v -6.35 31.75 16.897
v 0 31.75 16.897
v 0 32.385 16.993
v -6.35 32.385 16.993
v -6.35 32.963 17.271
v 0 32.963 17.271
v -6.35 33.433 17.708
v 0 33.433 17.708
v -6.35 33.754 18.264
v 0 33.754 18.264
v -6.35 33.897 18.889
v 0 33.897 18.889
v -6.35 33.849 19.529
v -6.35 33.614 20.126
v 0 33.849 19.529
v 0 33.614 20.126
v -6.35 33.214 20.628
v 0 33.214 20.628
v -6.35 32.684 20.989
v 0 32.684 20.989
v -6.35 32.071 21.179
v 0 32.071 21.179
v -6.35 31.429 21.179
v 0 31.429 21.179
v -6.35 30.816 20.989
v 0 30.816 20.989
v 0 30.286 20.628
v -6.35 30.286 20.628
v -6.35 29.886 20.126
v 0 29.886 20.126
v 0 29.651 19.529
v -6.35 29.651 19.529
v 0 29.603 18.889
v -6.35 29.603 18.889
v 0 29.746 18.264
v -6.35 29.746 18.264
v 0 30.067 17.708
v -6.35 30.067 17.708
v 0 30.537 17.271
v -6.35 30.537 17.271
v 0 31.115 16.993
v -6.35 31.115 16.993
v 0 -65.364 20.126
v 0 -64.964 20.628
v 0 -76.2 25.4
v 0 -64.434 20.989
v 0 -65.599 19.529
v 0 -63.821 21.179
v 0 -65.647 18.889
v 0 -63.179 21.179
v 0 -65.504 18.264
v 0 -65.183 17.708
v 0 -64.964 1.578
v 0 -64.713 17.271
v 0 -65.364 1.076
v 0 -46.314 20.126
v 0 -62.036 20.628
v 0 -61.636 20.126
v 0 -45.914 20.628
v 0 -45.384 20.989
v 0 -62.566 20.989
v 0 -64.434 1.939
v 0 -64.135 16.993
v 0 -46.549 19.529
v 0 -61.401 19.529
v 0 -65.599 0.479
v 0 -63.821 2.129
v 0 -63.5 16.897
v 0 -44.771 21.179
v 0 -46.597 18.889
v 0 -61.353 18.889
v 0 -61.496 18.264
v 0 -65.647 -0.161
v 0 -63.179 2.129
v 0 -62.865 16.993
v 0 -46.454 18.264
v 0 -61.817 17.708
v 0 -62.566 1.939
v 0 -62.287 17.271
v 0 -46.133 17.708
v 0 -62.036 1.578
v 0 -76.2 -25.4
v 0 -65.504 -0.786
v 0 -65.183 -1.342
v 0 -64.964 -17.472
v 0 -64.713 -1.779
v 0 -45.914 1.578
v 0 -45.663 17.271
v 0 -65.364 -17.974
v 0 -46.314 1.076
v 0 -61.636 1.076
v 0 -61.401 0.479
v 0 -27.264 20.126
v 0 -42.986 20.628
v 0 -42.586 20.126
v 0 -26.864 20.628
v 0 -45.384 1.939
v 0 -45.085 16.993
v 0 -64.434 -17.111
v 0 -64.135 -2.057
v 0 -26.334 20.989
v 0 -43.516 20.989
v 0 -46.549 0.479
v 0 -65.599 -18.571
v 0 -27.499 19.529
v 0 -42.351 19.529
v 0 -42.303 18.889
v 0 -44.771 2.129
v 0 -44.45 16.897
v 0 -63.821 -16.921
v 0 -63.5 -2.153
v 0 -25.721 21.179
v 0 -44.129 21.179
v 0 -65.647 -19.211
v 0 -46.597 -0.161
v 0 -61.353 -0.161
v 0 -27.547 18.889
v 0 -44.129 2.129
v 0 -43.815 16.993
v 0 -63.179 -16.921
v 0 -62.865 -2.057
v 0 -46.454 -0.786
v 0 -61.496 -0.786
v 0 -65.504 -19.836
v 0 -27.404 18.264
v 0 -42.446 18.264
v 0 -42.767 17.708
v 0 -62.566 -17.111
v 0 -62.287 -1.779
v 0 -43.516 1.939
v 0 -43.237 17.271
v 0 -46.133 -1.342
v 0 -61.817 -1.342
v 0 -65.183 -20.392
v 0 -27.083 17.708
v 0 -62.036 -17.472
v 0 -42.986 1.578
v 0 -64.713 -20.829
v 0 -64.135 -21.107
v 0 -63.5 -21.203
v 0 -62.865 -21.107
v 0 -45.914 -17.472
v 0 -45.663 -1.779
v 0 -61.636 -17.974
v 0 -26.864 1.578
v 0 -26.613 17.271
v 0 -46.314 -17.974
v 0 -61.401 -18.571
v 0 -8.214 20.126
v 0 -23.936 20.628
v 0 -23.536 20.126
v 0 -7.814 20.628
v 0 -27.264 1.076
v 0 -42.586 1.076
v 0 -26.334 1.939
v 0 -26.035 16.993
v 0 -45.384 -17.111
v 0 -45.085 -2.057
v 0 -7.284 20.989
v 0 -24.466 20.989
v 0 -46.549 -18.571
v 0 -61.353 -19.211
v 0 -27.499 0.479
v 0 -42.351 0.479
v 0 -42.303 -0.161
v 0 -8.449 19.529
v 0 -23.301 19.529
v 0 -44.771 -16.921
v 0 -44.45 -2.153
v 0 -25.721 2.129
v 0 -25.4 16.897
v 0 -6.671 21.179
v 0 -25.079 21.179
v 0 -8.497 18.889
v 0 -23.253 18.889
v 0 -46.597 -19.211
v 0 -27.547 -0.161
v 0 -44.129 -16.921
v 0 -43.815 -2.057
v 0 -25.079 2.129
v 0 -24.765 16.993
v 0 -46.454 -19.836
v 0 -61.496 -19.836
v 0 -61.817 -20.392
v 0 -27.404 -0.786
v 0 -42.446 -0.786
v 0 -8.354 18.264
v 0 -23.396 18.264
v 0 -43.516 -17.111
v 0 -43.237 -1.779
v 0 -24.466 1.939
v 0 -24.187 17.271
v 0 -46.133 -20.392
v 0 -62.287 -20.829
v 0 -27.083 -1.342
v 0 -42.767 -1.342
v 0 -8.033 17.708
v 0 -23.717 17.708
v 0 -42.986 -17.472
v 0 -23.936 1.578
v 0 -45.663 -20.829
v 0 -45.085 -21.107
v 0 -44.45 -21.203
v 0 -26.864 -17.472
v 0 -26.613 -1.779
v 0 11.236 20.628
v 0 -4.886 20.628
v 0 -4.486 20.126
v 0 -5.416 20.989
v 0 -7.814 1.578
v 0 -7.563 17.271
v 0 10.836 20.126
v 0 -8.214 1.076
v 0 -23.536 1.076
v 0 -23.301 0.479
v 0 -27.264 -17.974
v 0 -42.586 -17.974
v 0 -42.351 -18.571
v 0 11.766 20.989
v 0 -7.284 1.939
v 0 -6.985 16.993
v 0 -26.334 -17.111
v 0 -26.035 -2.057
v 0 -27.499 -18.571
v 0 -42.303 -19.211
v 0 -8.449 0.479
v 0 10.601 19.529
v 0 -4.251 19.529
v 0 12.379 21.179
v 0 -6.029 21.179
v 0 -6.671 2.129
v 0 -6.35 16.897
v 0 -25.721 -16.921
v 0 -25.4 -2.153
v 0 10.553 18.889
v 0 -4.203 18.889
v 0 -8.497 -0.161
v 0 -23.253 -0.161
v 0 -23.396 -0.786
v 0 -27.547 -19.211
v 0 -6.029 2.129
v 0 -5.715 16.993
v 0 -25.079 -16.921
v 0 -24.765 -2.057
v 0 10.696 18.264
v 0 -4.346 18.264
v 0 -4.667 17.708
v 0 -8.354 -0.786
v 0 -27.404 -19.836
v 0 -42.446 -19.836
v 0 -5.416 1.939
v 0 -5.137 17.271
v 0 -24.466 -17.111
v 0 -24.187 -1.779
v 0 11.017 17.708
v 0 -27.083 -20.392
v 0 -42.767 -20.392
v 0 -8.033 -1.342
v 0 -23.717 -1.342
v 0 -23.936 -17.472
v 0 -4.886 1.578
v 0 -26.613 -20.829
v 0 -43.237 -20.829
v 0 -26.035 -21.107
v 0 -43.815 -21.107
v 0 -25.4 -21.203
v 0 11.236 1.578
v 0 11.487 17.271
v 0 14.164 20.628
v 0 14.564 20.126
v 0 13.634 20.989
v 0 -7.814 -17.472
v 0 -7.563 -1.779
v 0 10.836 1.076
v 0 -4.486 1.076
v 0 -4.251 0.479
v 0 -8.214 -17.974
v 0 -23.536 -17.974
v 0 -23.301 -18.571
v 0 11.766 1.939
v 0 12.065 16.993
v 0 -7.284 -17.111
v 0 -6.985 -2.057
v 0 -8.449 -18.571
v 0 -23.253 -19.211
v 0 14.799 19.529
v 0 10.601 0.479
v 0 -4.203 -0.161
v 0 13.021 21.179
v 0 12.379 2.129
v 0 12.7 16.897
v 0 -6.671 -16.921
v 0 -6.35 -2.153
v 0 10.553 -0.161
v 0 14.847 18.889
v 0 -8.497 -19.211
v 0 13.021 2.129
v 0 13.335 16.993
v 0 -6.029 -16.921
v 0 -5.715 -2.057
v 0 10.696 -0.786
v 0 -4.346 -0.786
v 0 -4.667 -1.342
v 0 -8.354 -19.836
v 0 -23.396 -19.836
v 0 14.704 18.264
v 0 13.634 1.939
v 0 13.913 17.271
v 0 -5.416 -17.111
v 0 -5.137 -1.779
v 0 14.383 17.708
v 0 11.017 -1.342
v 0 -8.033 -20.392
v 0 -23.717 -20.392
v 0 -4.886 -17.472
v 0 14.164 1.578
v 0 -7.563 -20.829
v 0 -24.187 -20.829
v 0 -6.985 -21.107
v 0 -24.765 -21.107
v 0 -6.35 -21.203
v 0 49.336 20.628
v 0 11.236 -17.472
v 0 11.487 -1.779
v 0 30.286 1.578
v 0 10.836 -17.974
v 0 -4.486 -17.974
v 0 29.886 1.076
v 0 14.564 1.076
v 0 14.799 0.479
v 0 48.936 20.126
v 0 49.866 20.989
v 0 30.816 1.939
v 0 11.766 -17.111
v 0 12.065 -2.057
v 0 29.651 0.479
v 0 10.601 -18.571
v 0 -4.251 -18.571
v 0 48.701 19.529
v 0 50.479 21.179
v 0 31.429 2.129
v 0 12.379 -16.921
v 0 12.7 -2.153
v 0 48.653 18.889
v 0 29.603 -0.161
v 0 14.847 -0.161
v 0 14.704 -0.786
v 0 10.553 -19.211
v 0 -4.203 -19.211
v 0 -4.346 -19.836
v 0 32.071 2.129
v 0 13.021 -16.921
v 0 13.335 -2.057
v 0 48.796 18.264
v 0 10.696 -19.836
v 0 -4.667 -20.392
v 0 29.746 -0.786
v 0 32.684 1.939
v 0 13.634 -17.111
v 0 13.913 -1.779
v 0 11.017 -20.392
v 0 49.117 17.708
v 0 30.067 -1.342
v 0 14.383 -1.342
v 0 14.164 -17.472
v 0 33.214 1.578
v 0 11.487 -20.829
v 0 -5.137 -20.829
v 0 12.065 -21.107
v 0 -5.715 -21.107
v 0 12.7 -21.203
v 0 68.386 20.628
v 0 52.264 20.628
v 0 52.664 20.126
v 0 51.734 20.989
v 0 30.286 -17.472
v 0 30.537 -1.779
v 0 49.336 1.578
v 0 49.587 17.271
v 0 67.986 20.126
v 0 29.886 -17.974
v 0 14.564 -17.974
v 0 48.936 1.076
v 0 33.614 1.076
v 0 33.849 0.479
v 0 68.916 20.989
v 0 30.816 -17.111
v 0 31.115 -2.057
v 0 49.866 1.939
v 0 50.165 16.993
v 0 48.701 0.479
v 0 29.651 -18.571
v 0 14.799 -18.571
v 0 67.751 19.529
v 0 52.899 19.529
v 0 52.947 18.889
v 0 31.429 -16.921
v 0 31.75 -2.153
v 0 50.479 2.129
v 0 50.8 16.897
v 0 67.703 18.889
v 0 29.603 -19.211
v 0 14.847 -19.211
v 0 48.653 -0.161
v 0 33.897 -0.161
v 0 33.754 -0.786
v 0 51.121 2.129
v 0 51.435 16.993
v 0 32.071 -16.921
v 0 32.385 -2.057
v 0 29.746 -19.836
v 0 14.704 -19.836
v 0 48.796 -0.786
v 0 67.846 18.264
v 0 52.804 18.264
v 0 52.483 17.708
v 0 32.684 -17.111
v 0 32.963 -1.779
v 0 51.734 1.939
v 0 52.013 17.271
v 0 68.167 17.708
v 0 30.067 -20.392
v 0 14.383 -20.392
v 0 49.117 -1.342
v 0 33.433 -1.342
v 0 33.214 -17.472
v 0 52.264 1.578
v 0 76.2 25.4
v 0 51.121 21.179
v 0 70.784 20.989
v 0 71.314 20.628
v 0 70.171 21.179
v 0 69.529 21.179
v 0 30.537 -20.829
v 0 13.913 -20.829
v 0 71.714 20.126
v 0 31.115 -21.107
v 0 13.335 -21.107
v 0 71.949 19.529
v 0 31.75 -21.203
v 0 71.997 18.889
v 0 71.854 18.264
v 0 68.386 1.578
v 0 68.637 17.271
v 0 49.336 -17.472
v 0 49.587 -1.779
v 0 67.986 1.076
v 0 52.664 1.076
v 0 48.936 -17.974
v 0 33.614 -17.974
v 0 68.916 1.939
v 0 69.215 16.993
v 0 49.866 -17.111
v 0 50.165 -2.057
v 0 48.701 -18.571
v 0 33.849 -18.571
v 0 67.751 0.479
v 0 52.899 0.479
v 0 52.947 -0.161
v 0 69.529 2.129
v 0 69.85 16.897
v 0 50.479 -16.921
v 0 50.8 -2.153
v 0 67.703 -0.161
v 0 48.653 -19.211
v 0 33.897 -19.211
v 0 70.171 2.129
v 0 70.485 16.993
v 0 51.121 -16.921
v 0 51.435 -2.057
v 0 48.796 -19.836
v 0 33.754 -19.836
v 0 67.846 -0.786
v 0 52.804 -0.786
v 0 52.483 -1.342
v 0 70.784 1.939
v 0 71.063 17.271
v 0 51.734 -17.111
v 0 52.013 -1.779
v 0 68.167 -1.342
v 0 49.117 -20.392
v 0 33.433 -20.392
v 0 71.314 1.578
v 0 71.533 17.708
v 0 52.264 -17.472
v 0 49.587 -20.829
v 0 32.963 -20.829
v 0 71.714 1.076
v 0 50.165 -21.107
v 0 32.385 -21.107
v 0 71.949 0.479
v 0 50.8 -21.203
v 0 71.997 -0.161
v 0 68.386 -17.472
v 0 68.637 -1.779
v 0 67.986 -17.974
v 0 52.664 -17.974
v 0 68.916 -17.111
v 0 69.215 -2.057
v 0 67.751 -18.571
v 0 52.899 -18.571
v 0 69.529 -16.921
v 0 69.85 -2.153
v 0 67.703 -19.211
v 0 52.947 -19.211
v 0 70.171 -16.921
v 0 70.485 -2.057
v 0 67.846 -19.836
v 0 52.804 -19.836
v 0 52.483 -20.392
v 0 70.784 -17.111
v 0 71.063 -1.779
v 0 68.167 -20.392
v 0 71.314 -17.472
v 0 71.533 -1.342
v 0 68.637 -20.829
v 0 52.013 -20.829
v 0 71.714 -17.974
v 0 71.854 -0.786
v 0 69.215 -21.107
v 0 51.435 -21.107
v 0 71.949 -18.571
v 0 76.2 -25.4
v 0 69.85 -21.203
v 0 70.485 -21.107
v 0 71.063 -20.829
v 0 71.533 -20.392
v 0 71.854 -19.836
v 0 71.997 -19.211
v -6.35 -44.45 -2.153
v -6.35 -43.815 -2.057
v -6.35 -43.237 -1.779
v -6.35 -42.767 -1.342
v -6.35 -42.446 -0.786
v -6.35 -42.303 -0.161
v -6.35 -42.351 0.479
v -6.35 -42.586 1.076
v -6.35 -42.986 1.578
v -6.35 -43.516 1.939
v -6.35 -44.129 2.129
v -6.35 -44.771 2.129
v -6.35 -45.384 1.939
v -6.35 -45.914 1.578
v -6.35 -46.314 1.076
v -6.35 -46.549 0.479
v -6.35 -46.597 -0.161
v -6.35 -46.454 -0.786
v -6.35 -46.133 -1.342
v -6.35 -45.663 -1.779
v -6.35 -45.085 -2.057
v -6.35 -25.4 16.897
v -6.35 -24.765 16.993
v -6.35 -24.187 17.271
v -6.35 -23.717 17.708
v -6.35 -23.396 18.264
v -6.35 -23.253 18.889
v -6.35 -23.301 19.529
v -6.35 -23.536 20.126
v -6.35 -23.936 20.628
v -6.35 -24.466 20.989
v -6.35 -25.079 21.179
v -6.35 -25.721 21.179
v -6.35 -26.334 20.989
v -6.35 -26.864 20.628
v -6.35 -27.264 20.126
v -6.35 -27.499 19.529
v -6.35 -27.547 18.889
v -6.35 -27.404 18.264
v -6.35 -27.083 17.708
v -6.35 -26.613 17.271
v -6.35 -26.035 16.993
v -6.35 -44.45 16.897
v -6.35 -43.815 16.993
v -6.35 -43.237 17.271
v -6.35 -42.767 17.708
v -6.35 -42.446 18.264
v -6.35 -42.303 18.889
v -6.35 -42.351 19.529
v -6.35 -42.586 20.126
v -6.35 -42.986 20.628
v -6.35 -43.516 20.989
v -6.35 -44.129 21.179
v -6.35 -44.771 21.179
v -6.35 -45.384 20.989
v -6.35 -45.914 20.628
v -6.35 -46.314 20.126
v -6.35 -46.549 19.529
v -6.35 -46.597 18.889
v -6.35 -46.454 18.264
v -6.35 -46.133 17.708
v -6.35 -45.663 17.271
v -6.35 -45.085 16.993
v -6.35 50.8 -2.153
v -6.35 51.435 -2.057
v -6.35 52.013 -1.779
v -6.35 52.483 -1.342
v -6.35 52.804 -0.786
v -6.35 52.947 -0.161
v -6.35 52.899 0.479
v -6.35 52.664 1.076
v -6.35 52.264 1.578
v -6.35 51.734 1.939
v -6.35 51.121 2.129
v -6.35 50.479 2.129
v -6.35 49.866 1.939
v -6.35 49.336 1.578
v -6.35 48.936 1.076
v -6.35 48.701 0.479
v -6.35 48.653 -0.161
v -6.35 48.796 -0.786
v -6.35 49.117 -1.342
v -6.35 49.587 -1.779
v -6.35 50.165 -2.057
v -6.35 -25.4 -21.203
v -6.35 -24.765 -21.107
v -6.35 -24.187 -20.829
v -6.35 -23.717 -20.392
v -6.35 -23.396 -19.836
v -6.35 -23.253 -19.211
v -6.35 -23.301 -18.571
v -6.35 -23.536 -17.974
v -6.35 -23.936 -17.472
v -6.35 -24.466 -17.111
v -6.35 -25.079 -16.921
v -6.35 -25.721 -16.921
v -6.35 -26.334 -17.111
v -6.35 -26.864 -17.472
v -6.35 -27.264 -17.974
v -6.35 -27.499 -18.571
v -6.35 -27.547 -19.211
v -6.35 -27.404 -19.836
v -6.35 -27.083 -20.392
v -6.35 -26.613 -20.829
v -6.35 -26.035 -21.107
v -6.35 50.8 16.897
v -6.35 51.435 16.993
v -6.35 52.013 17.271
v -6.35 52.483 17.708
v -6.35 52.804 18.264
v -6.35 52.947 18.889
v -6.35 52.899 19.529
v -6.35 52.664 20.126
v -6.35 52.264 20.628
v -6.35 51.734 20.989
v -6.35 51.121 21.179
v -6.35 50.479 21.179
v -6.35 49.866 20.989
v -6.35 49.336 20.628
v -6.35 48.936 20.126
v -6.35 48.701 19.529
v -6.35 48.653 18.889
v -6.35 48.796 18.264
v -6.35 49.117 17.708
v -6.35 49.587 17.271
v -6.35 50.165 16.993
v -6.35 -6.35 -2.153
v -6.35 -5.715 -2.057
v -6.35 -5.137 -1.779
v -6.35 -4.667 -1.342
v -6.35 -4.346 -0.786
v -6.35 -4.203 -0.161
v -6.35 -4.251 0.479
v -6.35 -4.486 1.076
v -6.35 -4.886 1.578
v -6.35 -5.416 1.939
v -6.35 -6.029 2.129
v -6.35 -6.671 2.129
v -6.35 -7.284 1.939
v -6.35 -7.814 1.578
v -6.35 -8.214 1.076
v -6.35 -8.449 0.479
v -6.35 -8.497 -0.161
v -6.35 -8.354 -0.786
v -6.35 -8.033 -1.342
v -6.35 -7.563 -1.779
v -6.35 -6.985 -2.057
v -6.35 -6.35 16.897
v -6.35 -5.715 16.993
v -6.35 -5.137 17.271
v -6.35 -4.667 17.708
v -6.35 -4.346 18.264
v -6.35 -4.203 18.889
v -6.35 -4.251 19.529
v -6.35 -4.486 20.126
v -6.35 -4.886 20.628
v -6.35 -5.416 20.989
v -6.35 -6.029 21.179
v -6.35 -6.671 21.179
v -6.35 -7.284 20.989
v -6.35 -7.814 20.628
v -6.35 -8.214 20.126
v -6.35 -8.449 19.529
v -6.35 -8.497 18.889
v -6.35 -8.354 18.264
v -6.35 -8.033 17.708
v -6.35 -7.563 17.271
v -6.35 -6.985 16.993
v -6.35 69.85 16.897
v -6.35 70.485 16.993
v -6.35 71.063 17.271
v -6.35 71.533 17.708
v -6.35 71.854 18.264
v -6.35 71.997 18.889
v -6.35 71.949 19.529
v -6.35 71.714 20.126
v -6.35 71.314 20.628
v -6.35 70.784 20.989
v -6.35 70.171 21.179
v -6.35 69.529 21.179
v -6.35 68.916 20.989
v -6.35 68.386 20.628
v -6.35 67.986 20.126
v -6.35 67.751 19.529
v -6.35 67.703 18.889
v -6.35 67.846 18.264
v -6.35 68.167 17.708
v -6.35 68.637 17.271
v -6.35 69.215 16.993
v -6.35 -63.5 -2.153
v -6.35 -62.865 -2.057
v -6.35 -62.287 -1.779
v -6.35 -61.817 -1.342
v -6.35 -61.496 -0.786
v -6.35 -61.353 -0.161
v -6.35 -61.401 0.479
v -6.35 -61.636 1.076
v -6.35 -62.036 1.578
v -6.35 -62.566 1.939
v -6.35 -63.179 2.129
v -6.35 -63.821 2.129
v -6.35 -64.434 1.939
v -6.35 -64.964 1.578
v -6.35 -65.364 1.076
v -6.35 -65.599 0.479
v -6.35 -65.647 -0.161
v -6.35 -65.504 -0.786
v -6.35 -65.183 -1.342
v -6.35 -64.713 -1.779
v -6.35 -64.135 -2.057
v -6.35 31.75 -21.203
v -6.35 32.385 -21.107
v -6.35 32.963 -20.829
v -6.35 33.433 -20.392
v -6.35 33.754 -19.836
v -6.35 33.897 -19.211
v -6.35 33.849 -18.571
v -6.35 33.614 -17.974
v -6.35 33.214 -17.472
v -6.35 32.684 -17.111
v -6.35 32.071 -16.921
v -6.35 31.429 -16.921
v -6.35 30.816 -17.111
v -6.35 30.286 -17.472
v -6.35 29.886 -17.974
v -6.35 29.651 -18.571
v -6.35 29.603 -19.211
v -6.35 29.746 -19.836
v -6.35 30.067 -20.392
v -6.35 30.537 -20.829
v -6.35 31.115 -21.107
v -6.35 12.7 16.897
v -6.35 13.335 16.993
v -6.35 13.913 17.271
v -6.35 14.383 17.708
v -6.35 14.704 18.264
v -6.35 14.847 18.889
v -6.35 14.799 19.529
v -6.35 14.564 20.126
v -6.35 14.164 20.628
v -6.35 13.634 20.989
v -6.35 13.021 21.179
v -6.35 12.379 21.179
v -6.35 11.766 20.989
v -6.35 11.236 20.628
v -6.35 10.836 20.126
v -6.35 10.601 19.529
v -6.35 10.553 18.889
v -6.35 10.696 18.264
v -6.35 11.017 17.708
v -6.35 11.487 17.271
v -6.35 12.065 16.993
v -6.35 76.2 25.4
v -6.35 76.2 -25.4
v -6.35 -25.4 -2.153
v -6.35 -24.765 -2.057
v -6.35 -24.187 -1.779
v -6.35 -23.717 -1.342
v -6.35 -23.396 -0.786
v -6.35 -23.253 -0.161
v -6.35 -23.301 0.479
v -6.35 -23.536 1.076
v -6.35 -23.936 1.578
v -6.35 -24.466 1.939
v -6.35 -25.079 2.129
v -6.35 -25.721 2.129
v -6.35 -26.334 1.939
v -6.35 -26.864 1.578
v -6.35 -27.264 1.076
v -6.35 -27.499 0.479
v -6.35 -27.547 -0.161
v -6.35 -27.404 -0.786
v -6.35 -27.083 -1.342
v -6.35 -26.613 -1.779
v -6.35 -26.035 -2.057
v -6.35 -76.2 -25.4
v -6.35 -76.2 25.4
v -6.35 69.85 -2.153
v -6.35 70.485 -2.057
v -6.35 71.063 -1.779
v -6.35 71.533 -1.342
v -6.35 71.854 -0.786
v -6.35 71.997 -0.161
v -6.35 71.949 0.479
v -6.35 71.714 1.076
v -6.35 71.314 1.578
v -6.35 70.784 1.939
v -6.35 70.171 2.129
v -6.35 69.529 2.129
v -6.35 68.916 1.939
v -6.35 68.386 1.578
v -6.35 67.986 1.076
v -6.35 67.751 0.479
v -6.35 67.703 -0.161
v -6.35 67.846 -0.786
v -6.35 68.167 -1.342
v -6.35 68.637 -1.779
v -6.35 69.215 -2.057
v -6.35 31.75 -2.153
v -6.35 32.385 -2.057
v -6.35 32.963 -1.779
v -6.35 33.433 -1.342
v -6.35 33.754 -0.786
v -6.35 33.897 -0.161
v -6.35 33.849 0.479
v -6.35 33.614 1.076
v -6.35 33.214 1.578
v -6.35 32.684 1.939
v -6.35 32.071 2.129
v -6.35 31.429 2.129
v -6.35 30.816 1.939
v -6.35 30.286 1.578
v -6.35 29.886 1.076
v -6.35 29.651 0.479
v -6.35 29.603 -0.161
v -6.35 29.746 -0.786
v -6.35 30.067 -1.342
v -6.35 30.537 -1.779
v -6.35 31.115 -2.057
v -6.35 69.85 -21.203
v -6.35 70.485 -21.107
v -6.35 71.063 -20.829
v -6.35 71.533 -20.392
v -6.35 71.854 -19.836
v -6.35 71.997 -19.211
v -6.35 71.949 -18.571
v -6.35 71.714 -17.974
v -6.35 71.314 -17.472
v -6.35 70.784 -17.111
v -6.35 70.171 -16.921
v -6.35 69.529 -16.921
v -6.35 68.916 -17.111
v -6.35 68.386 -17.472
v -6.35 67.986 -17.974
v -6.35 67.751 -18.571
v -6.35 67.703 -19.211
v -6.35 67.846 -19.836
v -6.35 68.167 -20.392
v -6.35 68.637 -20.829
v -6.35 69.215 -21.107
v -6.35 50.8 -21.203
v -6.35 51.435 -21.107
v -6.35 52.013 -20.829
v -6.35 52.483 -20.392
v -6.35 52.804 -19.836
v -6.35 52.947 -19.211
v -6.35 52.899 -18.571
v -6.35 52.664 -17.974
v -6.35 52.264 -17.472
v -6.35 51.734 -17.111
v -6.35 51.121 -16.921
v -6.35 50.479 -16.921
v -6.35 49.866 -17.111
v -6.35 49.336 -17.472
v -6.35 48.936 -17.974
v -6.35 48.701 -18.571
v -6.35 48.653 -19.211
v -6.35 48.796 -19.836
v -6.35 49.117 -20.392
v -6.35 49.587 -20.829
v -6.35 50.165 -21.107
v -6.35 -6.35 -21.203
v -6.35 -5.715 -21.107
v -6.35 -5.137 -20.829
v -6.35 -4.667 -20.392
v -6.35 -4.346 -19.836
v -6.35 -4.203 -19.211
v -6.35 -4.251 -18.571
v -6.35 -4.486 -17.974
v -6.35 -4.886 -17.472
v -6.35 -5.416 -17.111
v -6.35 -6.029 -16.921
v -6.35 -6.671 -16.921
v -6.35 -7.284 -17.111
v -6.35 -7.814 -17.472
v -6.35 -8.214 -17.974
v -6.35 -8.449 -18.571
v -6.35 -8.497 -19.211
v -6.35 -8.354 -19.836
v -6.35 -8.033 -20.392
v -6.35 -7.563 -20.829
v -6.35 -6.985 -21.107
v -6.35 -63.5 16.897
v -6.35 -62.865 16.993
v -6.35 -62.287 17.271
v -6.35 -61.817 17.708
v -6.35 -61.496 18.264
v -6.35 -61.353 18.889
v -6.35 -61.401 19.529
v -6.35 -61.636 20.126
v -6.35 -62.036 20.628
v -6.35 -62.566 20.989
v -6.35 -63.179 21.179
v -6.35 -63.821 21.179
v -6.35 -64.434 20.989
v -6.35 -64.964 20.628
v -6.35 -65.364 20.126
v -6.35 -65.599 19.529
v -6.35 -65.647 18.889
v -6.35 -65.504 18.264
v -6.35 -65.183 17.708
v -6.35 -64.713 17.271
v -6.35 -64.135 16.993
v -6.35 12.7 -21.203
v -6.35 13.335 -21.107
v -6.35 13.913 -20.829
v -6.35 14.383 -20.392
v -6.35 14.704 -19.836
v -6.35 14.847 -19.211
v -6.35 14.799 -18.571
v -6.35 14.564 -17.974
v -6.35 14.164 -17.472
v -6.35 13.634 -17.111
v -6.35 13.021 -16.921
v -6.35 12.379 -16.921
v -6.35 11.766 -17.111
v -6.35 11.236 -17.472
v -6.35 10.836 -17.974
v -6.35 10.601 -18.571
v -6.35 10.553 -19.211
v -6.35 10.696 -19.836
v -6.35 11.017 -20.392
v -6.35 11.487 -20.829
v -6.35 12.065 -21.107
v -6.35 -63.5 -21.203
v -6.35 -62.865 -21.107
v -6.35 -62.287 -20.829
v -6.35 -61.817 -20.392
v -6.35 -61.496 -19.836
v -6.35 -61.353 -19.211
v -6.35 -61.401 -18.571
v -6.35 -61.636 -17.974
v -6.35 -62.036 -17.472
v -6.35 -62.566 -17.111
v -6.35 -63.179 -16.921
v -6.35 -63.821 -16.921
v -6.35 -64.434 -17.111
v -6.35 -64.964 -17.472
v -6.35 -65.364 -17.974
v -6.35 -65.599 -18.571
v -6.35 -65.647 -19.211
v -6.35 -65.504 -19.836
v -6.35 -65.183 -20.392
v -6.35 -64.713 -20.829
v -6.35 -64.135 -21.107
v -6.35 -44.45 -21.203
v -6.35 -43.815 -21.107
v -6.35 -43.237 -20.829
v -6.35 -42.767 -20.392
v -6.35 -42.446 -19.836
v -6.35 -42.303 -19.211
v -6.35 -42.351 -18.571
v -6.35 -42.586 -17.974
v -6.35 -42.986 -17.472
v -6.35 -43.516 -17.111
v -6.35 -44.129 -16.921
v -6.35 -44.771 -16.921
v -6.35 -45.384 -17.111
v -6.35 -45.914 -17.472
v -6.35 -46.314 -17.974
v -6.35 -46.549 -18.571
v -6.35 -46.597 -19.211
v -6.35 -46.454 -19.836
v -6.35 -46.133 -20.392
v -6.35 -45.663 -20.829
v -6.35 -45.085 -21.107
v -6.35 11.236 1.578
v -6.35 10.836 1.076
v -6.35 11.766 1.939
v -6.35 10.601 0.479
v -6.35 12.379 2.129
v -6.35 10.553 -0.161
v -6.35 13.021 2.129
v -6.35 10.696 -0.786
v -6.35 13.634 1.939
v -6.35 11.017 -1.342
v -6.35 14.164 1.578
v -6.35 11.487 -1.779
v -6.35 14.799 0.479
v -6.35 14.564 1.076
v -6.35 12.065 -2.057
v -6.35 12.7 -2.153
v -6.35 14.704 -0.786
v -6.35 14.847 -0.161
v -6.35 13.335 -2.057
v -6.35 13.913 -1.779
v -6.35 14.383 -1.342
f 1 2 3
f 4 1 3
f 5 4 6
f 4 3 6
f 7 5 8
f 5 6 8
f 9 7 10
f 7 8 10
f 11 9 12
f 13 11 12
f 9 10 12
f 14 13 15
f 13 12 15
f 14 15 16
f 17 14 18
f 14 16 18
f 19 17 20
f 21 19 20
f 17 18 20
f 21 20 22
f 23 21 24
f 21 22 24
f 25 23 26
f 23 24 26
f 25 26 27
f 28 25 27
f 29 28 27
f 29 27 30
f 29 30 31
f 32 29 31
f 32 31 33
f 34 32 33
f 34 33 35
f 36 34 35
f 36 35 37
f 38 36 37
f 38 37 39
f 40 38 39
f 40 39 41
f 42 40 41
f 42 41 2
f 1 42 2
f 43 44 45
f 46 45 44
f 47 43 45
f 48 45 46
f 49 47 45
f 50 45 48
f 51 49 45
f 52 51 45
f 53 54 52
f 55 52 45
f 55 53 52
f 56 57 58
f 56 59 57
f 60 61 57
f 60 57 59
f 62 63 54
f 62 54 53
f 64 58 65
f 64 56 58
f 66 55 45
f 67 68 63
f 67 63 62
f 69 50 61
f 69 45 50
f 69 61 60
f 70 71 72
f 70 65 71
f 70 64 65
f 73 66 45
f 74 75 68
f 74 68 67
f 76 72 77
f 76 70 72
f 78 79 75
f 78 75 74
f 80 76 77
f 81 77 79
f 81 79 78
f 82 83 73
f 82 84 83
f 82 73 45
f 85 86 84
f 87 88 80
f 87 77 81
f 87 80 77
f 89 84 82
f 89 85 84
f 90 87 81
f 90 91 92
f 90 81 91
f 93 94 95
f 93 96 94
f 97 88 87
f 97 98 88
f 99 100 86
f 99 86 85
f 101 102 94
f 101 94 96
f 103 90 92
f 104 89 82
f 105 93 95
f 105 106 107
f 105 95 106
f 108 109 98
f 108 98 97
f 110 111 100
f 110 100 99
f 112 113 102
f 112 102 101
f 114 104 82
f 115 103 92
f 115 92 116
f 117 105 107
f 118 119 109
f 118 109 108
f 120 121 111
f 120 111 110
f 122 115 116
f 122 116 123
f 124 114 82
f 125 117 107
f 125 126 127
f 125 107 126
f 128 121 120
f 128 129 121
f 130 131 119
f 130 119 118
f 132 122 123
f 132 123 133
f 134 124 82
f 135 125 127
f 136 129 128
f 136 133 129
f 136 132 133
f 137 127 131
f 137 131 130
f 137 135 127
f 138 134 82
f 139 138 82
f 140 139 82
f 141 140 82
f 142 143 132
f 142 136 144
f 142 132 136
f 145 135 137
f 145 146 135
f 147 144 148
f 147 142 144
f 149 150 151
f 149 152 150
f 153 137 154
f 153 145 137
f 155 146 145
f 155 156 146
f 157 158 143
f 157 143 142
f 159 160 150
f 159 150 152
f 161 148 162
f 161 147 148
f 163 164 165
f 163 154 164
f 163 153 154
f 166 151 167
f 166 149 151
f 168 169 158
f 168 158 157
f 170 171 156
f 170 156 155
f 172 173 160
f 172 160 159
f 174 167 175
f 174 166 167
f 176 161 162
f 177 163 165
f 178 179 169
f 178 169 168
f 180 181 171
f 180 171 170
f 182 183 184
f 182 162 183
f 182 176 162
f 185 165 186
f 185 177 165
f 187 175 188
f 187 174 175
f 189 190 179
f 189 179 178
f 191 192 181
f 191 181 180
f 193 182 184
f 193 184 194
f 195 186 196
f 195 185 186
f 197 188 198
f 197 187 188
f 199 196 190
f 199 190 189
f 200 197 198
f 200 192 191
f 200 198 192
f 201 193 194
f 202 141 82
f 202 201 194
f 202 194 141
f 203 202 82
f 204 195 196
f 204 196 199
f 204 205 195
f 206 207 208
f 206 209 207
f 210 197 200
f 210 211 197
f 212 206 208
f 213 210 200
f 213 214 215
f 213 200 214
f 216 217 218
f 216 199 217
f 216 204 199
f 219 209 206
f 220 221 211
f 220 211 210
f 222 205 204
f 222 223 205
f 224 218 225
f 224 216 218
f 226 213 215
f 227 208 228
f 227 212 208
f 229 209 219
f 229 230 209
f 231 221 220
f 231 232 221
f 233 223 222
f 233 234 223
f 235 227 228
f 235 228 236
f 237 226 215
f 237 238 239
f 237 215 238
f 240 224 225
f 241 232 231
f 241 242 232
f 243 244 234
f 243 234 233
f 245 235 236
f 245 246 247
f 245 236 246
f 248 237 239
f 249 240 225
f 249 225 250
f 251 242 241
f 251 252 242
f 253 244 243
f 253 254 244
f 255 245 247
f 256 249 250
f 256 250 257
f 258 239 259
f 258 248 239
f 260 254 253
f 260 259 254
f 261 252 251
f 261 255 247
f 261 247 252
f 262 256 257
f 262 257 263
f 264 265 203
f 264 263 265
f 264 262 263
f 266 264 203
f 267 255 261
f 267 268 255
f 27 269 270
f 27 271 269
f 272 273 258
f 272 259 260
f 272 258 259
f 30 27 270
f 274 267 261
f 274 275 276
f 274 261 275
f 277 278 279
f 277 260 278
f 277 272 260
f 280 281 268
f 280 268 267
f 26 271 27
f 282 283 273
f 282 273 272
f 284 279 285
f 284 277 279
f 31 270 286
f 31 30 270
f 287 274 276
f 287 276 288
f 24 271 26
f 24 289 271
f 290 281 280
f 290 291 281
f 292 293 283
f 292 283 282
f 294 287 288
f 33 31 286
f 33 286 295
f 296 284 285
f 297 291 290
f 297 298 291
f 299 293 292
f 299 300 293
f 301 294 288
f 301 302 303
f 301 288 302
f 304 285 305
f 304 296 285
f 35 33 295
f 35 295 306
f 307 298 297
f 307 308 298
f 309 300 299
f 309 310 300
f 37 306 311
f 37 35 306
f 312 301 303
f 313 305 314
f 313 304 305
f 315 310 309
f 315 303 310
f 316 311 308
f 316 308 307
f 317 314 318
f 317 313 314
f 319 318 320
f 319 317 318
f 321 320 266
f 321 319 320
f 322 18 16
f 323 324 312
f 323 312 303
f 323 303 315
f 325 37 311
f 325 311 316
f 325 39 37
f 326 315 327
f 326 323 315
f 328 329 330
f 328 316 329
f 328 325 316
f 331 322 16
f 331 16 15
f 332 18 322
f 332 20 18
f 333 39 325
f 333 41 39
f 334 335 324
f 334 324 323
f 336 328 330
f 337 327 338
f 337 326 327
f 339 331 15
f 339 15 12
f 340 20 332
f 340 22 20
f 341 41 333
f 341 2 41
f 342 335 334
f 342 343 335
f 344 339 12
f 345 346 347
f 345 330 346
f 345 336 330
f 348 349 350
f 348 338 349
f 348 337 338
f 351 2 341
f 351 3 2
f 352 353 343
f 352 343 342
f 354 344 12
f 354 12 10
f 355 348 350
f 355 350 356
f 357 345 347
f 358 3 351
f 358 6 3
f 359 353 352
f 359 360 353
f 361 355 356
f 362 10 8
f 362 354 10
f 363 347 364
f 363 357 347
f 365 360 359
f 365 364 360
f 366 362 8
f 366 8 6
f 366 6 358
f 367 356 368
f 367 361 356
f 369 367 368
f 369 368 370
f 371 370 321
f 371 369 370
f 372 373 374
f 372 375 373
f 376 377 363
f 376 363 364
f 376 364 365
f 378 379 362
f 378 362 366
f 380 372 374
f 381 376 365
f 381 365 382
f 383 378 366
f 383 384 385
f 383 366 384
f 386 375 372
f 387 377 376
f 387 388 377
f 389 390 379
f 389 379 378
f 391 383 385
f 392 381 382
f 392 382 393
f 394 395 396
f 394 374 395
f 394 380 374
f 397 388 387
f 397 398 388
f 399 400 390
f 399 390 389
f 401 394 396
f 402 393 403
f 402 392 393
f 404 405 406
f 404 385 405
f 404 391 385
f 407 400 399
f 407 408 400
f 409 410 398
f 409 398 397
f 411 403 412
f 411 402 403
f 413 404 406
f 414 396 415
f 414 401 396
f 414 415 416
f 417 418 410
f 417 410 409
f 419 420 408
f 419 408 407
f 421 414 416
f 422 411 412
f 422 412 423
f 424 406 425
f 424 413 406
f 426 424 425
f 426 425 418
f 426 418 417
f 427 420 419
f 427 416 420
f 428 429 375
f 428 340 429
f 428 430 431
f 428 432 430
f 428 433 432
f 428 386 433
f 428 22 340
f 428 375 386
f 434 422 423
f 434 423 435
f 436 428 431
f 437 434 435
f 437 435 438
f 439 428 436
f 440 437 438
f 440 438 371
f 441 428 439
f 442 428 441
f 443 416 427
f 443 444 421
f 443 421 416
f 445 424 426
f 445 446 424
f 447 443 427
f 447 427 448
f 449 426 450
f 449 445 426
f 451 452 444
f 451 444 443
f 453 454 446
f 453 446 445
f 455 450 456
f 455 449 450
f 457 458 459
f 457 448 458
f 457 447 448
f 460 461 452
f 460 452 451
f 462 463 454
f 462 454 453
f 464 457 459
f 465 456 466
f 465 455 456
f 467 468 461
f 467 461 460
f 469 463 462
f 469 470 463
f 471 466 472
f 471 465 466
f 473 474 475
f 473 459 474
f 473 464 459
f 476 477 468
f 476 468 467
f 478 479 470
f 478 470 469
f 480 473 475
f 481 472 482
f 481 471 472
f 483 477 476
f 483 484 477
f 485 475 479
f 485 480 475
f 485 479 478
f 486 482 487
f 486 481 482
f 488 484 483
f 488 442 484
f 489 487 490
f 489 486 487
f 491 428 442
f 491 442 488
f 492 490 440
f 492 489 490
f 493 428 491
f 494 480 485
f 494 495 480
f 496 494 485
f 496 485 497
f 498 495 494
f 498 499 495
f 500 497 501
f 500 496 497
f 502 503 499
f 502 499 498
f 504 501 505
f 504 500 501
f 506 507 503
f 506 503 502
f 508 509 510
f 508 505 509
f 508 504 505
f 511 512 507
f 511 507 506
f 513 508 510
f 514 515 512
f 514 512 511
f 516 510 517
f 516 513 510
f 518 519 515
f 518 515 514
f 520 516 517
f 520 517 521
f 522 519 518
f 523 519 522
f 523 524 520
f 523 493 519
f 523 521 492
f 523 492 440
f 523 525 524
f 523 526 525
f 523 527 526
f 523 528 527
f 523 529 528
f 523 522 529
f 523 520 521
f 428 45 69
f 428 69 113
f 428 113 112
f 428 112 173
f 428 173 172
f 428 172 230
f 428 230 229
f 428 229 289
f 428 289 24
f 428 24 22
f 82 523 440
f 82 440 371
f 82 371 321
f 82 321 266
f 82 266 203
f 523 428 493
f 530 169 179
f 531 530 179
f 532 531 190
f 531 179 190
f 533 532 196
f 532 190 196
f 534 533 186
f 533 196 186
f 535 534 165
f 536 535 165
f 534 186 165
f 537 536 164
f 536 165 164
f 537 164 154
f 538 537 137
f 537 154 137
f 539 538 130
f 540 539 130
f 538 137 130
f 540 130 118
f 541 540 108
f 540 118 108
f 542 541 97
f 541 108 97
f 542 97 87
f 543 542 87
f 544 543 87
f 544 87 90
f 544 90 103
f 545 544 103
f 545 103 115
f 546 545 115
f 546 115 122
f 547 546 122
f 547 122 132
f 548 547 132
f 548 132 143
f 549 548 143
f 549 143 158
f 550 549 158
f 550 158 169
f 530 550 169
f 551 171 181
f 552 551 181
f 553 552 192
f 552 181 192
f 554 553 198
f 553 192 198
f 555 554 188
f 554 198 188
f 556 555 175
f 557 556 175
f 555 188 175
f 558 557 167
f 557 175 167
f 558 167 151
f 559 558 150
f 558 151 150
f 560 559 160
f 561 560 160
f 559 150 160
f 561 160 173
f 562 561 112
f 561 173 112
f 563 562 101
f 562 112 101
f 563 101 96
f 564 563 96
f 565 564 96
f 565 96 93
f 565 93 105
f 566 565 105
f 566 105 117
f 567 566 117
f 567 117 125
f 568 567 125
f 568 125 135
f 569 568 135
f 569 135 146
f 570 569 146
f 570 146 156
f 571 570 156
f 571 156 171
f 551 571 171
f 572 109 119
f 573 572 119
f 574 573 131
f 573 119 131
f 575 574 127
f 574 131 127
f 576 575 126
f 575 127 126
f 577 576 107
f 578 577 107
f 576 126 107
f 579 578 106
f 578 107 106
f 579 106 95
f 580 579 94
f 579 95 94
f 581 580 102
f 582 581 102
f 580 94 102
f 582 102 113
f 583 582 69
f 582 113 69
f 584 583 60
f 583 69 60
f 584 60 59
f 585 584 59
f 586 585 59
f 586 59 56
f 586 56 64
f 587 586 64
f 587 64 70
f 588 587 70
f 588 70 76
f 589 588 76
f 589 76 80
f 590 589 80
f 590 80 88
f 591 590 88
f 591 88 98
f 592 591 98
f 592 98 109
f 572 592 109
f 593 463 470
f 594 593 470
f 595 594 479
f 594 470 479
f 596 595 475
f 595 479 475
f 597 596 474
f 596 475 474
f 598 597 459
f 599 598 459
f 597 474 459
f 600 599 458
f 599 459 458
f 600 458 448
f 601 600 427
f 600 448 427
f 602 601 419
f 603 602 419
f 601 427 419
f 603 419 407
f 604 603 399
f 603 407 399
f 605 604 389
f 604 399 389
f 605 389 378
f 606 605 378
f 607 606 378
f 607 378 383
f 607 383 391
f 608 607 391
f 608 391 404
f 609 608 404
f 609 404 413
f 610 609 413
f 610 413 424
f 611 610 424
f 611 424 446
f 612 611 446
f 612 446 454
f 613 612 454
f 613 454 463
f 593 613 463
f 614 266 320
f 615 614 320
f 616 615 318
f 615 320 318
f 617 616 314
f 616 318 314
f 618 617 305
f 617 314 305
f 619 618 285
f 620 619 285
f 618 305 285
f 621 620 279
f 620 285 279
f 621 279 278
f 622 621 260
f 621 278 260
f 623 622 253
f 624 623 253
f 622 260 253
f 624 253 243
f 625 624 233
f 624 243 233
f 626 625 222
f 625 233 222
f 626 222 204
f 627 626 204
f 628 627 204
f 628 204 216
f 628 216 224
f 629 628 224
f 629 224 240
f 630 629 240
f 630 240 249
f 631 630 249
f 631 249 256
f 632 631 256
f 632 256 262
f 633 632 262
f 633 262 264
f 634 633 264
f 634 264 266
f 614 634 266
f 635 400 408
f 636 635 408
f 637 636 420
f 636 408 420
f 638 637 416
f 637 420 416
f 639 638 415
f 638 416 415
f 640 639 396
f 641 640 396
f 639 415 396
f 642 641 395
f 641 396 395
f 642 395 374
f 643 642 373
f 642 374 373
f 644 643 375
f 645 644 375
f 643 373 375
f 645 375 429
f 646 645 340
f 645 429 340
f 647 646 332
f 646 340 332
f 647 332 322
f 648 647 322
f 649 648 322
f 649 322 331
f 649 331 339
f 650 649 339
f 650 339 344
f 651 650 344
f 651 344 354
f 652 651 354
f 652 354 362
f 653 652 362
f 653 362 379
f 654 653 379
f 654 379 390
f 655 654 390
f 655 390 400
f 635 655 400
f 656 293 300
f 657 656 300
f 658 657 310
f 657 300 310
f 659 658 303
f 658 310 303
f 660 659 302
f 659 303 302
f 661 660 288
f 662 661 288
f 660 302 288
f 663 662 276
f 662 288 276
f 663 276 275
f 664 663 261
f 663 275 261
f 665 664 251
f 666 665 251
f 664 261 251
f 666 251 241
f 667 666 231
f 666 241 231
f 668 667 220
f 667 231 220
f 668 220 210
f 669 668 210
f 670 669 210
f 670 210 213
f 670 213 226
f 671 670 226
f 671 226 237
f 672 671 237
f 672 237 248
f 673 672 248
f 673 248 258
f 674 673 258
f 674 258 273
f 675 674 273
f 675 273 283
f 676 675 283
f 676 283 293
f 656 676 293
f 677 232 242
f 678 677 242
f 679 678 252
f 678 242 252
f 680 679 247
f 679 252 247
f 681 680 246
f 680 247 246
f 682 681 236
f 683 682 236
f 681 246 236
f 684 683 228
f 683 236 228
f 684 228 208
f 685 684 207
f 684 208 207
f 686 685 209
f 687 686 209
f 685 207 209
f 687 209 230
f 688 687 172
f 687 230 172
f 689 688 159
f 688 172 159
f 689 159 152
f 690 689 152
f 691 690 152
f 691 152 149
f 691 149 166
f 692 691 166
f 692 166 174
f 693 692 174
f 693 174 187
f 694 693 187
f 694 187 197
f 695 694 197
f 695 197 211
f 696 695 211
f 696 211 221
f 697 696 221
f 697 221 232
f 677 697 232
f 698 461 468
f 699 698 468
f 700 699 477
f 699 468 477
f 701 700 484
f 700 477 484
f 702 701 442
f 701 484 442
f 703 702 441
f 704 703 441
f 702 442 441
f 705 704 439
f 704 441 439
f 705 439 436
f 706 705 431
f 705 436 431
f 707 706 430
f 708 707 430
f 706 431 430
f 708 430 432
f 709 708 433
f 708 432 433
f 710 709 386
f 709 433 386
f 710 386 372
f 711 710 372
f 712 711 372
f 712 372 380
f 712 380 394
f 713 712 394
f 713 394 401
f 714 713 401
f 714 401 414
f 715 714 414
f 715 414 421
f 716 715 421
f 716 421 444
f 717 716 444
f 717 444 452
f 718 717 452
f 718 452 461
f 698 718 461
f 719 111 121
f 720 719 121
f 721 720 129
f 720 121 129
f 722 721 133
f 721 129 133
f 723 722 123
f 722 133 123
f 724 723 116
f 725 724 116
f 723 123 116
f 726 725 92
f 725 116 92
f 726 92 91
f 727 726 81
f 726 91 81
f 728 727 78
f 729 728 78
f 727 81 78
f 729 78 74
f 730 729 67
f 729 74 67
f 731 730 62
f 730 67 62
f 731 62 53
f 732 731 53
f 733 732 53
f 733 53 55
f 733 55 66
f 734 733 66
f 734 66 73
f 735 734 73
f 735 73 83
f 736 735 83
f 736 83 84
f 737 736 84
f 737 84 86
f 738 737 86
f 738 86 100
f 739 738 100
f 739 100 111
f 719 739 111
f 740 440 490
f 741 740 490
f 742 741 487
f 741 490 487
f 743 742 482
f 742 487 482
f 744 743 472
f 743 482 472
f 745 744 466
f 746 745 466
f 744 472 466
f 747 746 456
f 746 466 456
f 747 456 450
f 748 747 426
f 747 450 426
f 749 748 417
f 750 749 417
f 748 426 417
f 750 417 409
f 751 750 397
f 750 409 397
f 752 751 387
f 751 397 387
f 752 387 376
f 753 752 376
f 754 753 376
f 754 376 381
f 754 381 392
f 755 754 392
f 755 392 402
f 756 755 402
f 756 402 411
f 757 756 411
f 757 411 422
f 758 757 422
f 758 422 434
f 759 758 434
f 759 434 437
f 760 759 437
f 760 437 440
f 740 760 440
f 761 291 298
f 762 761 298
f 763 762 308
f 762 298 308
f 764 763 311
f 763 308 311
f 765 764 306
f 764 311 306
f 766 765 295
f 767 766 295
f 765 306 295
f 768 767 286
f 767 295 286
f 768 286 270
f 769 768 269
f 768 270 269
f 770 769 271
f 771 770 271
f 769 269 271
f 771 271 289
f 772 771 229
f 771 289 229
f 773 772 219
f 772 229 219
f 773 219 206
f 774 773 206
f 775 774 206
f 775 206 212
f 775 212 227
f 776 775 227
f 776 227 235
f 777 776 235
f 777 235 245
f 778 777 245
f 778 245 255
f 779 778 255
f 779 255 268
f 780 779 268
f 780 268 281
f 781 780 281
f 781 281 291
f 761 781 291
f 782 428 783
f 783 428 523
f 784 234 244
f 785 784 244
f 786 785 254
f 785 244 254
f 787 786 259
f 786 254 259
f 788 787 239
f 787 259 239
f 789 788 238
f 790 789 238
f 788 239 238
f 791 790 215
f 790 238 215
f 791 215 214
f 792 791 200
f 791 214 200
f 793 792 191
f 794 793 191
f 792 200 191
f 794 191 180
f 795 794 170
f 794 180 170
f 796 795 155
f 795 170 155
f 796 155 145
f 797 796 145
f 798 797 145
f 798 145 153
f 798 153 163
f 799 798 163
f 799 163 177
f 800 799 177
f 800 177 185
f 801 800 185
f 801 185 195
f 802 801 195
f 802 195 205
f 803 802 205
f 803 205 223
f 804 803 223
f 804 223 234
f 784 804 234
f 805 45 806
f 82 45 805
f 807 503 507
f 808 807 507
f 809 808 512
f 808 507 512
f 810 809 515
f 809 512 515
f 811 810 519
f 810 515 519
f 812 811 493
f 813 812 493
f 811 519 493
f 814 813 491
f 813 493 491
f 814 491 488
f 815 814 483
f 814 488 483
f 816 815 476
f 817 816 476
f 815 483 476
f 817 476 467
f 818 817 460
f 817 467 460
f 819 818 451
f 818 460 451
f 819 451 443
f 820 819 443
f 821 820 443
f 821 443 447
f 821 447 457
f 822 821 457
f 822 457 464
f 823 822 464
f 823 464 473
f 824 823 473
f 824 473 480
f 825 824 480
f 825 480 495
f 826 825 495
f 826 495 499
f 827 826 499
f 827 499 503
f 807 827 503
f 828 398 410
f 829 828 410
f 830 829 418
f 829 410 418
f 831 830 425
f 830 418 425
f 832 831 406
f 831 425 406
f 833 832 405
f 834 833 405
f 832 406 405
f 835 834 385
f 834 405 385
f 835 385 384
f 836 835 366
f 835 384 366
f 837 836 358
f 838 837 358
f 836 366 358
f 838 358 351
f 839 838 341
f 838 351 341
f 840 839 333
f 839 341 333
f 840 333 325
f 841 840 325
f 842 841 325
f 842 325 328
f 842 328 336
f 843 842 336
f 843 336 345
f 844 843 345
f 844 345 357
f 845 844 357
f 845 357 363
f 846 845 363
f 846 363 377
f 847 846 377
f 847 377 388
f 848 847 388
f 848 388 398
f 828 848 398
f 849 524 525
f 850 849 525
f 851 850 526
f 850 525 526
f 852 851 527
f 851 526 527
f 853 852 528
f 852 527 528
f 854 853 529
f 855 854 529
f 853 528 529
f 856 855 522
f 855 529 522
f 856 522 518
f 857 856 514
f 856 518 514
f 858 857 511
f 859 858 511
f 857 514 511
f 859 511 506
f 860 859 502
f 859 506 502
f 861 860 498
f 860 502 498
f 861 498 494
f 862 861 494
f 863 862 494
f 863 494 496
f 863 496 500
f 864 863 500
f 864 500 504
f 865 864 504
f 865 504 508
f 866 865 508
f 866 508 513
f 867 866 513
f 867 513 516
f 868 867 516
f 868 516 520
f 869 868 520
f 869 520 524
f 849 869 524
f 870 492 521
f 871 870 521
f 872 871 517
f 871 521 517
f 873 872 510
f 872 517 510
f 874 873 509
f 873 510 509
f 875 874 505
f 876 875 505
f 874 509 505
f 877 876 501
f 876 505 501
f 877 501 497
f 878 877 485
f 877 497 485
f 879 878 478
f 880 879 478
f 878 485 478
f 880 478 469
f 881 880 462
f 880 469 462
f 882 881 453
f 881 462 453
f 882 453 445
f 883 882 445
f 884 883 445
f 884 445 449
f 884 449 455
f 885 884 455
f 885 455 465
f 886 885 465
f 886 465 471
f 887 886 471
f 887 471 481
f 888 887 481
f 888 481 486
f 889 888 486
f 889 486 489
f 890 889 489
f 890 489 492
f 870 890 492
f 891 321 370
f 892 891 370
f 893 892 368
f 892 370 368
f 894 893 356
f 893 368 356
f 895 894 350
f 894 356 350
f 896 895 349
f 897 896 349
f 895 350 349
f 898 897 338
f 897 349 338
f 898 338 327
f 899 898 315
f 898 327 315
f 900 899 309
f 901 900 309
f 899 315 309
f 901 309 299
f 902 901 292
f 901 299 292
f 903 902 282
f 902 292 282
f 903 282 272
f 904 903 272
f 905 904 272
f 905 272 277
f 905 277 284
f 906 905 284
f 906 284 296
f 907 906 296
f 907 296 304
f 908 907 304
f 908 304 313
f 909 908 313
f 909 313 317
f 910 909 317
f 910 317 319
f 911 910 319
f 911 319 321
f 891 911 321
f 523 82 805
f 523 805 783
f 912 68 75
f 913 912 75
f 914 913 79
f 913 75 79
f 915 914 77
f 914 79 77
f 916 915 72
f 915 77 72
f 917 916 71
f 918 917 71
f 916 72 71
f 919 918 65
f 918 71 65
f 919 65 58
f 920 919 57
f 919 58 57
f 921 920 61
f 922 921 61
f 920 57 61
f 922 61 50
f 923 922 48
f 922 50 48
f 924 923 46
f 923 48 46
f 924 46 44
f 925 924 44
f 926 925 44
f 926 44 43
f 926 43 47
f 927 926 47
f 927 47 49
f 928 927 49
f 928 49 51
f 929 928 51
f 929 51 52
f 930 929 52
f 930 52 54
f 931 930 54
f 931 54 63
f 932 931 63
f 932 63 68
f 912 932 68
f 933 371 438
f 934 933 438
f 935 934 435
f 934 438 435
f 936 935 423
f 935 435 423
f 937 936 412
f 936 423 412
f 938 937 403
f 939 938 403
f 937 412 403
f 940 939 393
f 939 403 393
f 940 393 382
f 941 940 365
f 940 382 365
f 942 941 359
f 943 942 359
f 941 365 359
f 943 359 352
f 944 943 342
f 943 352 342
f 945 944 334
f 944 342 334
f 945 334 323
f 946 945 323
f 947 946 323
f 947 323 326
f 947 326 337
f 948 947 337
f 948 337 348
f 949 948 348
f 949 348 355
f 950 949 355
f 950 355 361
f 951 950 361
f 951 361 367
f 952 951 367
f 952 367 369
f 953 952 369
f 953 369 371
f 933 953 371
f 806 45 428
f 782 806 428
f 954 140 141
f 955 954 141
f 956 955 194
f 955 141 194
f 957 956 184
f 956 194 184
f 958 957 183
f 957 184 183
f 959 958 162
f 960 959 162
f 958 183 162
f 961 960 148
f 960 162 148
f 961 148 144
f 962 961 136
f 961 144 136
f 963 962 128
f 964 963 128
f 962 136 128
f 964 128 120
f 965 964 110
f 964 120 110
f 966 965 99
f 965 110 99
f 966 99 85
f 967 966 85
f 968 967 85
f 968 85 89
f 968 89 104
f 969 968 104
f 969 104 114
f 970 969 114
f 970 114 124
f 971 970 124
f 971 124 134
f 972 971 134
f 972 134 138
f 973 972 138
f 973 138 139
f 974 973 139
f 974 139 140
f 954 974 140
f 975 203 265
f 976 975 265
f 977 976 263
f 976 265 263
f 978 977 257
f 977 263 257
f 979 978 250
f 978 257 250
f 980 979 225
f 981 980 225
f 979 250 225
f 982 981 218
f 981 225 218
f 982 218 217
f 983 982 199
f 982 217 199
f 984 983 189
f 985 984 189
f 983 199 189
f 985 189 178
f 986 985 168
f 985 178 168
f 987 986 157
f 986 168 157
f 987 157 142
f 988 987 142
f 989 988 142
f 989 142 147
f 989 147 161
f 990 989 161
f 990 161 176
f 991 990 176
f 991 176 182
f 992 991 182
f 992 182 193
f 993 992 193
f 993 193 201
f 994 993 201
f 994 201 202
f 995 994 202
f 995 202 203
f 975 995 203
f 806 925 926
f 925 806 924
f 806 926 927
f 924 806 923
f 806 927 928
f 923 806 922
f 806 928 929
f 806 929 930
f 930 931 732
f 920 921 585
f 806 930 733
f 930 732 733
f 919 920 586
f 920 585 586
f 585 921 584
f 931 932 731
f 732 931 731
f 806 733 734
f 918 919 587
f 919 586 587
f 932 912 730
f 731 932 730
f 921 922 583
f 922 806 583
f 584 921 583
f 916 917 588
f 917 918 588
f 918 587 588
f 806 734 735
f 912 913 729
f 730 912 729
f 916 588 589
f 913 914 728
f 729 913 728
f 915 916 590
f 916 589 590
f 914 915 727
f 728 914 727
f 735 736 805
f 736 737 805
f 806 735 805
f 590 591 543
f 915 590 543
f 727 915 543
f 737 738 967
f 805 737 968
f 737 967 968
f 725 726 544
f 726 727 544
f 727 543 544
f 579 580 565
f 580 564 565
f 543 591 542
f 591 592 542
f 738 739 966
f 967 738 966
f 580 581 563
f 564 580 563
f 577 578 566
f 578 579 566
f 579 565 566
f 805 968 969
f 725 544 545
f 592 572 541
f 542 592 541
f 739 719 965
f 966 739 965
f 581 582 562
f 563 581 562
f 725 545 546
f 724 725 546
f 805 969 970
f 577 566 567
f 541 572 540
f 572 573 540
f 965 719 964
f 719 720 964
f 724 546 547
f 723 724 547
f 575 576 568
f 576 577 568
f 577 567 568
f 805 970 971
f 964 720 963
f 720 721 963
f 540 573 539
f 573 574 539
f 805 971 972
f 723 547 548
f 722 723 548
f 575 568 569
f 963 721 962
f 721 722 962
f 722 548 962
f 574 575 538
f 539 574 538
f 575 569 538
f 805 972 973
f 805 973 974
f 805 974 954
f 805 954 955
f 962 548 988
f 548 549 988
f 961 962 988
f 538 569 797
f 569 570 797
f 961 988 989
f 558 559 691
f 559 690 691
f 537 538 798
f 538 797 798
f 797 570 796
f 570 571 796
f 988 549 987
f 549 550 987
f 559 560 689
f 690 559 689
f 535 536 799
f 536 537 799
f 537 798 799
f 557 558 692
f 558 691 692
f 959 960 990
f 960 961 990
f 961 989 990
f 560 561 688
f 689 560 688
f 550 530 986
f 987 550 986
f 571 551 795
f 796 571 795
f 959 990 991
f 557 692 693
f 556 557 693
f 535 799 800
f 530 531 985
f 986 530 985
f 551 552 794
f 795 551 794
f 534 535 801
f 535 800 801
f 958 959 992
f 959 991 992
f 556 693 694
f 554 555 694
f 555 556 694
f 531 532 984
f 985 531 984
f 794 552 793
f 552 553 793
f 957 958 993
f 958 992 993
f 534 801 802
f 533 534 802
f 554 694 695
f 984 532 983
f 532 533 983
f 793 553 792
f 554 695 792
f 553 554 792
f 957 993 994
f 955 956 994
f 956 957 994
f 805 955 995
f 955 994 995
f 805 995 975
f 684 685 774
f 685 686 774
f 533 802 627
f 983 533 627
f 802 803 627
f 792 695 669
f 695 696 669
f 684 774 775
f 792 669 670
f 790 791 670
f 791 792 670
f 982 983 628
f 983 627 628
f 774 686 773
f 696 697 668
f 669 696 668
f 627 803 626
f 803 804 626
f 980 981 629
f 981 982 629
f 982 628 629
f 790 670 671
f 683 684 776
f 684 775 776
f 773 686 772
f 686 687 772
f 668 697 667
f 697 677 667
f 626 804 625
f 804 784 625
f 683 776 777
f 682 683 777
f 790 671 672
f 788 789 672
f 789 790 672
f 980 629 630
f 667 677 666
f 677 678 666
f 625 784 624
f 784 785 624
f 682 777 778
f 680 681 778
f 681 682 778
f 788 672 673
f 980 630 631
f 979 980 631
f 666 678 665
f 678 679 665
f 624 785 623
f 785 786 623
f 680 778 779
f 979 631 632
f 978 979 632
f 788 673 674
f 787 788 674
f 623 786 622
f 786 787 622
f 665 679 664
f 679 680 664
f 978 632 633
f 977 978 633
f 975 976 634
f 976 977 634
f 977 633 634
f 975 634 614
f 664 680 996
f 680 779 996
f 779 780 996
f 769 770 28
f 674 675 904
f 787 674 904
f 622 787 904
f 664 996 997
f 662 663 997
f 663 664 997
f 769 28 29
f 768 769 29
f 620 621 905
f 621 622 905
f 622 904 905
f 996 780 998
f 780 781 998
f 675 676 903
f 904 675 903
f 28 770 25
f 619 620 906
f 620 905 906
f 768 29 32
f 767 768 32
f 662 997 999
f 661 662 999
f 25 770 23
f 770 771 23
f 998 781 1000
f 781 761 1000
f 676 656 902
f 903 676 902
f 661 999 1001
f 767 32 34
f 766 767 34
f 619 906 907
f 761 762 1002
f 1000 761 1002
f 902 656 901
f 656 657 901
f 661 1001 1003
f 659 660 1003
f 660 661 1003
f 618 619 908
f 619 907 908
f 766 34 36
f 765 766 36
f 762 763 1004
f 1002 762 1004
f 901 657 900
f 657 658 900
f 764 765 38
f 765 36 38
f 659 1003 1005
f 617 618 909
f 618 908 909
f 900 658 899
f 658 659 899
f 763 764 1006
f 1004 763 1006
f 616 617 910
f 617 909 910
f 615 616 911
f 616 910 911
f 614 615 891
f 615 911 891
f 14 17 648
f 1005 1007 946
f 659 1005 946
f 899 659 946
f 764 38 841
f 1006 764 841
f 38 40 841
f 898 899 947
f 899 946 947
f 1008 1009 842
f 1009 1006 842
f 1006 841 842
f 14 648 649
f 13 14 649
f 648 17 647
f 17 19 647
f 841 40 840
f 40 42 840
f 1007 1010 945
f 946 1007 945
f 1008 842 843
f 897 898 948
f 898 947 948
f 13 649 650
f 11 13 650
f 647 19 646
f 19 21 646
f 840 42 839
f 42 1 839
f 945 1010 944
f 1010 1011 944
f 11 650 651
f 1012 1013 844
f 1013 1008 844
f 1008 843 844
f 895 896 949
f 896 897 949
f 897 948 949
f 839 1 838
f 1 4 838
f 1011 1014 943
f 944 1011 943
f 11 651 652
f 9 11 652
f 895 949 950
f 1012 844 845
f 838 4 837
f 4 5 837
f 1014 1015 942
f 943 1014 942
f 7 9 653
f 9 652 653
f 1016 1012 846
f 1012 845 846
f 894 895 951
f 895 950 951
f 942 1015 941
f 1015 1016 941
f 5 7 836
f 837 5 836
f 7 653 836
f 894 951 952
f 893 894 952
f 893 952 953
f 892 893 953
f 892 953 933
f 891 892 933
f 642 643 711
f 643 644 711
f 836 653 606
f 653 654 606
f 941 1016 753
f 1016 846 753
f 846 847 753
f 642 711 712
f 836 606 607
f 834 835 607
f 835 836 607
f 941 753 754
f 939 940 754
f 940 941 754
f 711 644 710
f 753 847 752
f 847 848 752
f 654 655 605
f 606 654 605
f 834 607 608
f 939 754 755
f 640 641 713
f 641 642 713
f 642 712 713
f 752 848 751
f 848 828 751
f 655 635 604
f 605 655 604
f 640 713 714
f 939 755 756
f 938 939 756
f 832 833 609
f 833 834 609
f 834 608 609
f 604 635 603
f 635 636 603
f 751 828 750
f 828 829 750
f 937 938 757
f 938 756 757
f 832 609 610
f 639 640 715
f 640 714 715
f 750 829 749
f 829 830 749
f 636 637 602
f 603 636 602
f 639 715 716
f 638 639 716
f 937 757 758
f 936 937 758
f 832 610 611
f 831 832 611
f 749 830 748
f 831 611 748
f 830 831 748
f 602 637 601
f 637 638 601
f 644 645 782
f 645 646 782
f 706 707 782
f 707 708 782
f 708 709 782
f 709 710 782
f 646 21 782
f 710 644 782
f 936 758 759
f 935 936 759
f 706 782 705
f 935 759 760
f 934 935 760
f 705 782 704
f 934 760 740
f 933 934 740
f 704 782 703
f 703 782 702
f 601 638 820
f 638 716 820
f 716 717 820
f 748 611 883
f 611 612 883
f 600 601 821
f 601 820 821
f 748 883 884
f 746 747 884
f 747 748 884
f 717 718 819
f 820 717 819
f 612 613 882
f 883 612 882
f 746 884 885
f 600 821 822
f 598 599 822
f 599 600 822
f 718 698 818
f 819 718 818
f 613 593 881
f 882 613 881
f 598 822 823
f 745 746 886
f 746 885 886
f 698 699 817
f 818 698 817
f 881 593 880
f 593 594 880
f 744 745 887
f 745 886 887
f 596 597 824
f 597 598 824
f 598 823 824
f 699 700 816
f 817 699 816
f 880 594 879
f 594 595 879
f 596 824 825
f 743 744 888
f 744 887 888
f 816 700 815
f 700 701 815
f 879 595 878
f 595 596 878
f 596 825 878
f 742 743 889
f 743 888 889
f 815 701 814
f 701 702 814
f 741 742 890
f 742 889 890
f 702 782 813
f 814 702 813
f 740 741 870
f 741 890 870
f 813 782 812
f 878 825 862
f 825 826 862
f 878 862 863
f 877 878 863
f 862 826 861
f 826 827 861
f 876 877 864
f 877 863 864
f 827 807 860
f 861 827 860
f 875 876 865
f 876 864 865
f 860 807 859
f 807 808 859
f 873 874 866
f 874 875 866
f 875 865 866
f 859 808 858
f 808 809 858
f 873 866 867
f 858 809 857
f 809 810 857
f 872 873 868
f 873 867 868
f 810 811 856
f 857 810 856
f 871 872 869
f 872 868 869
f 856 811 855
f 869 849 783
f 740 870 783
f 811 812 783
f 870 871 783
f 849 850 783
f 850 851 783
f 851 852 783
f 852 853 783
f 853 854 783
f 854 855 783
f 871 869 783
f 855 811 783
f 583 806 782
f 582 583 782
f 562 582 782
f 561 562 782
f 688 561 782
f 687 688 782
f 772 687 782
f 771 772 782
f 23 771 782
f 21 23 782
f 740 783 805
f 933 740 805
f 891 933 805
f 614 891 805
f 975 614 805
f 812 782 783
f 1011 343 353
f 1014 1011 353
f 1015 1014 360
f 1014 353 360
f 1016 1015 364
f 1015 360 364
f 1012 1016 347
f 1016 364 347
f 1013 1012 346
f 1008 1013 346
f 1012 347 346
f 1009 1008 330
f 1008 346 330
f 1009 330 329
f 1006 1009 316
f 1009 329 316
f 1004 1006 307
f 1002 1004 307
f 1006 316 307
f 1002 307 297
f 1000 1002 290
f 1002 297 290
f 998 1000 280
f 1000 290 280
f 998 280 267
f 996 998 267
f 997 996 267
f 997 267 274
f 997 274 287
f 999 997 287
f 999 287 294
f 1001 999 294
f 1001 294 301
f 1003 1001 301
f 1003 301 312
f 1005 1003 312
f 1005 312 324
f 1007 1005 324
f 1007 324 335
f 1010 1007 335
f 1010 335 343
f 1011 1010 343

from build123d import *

# Parameters (mm, degrees)
SKETCH1_W           = 50.8
SKETCH1_H           = 152.4
BOSS_EXTRUDE1_DEPTH = 6.35
SKETCH2_R           = 2.15265
CUT_EXTRUDE1_DEPTH  = 81.572467382


with BuildPart() as part:
    # Sketch1 → Boss-Extrude1 (new body)
    with BuildSketch(Plane(origin=(0, 0, 0), x_dir=(0, 0, -1), z_dir=(1, 0, 0))):
        Rectangle(SKETCH1_W, SKETCH1_H)
    extrude(amount=-BOSS_EXTRUDE1_DEPTH)

    # Sketch2 → Cut-Extrude1 (cut, through all)
    with BuildSketch(Plane(origin=(0, 0, 0), x_dir=(0, 0, -1), z_dir=(1, 0, 0))):
        with Locations((-19.05, 69.85)):
            Circle(SKETCH2_R)
        with Locations((0, 69.85)):
            Circle(SKETCH2_R)
        with Locations((19.05, 69.85)):
            Circle(SKETCH2_R)
        with Locations((0, 50.8)):
            Circle(SKETCH2_R)
        with Locations((19.05, 50.8)):
            Circle(SKETCH2_R)
        with Locations((0, 31.75)):
            Circle(SKETCH2_R)
        with Locations((19.05, 31.75)):
            Circle(SKETCH2_R)
        with Locations((0, 12.7)):
            Circle(SKETCH2_R)
        with Locations((19.05, 12.7)):
            Circle(SKETCH2_R)
        with Locations((0, -6.35)):
            Circle(SKETCH2_R)
        with Locations((19.05, -6.35)):
            Circle(SKETCH2_R)
        with Locations((0, -25.4)):
            Circle(SKETCH2_R)
        with Locations((19.05, -25.4)):
            Circle(SKETCH2_R)
        with Locations((0, -44.45)):
            Circle(SKETCH2_R)
        with Locations((19.05, -44.45)):
            Circle(SKETCH2_R)
        with Locations((0, -63.5)):
            Circle(SKETCH2_R)
        with Locations((19.05, -63.5)):
            Circle(SKETCH2_R)
        with Locations((-19.05, 50.8)):
            Circle(SKETCH2_R)
        with Locations((-19.05, 31.75)):
            Circle(SKETCH2_R)
        with Locations((-19.05, 12.7)):
            Circle(SKETCH2_R)
        with Locations((-19.05, -6.35)):
            Circle(SKETCH2_R)
        with Locations((-19.05, -25.4)):
            Circle(SKETCH2_R)
        with Locations((-19.05, -44.45)):
            Circle(SKETCH2_R)
        with Locations((-19.05, -63.5)):
            Circle(SKETCH2_R)
    extrude(amount=-CUT_EXTRUDE1_DEPTH, mode=Mode.SUBTRACT)


solid = part.part
